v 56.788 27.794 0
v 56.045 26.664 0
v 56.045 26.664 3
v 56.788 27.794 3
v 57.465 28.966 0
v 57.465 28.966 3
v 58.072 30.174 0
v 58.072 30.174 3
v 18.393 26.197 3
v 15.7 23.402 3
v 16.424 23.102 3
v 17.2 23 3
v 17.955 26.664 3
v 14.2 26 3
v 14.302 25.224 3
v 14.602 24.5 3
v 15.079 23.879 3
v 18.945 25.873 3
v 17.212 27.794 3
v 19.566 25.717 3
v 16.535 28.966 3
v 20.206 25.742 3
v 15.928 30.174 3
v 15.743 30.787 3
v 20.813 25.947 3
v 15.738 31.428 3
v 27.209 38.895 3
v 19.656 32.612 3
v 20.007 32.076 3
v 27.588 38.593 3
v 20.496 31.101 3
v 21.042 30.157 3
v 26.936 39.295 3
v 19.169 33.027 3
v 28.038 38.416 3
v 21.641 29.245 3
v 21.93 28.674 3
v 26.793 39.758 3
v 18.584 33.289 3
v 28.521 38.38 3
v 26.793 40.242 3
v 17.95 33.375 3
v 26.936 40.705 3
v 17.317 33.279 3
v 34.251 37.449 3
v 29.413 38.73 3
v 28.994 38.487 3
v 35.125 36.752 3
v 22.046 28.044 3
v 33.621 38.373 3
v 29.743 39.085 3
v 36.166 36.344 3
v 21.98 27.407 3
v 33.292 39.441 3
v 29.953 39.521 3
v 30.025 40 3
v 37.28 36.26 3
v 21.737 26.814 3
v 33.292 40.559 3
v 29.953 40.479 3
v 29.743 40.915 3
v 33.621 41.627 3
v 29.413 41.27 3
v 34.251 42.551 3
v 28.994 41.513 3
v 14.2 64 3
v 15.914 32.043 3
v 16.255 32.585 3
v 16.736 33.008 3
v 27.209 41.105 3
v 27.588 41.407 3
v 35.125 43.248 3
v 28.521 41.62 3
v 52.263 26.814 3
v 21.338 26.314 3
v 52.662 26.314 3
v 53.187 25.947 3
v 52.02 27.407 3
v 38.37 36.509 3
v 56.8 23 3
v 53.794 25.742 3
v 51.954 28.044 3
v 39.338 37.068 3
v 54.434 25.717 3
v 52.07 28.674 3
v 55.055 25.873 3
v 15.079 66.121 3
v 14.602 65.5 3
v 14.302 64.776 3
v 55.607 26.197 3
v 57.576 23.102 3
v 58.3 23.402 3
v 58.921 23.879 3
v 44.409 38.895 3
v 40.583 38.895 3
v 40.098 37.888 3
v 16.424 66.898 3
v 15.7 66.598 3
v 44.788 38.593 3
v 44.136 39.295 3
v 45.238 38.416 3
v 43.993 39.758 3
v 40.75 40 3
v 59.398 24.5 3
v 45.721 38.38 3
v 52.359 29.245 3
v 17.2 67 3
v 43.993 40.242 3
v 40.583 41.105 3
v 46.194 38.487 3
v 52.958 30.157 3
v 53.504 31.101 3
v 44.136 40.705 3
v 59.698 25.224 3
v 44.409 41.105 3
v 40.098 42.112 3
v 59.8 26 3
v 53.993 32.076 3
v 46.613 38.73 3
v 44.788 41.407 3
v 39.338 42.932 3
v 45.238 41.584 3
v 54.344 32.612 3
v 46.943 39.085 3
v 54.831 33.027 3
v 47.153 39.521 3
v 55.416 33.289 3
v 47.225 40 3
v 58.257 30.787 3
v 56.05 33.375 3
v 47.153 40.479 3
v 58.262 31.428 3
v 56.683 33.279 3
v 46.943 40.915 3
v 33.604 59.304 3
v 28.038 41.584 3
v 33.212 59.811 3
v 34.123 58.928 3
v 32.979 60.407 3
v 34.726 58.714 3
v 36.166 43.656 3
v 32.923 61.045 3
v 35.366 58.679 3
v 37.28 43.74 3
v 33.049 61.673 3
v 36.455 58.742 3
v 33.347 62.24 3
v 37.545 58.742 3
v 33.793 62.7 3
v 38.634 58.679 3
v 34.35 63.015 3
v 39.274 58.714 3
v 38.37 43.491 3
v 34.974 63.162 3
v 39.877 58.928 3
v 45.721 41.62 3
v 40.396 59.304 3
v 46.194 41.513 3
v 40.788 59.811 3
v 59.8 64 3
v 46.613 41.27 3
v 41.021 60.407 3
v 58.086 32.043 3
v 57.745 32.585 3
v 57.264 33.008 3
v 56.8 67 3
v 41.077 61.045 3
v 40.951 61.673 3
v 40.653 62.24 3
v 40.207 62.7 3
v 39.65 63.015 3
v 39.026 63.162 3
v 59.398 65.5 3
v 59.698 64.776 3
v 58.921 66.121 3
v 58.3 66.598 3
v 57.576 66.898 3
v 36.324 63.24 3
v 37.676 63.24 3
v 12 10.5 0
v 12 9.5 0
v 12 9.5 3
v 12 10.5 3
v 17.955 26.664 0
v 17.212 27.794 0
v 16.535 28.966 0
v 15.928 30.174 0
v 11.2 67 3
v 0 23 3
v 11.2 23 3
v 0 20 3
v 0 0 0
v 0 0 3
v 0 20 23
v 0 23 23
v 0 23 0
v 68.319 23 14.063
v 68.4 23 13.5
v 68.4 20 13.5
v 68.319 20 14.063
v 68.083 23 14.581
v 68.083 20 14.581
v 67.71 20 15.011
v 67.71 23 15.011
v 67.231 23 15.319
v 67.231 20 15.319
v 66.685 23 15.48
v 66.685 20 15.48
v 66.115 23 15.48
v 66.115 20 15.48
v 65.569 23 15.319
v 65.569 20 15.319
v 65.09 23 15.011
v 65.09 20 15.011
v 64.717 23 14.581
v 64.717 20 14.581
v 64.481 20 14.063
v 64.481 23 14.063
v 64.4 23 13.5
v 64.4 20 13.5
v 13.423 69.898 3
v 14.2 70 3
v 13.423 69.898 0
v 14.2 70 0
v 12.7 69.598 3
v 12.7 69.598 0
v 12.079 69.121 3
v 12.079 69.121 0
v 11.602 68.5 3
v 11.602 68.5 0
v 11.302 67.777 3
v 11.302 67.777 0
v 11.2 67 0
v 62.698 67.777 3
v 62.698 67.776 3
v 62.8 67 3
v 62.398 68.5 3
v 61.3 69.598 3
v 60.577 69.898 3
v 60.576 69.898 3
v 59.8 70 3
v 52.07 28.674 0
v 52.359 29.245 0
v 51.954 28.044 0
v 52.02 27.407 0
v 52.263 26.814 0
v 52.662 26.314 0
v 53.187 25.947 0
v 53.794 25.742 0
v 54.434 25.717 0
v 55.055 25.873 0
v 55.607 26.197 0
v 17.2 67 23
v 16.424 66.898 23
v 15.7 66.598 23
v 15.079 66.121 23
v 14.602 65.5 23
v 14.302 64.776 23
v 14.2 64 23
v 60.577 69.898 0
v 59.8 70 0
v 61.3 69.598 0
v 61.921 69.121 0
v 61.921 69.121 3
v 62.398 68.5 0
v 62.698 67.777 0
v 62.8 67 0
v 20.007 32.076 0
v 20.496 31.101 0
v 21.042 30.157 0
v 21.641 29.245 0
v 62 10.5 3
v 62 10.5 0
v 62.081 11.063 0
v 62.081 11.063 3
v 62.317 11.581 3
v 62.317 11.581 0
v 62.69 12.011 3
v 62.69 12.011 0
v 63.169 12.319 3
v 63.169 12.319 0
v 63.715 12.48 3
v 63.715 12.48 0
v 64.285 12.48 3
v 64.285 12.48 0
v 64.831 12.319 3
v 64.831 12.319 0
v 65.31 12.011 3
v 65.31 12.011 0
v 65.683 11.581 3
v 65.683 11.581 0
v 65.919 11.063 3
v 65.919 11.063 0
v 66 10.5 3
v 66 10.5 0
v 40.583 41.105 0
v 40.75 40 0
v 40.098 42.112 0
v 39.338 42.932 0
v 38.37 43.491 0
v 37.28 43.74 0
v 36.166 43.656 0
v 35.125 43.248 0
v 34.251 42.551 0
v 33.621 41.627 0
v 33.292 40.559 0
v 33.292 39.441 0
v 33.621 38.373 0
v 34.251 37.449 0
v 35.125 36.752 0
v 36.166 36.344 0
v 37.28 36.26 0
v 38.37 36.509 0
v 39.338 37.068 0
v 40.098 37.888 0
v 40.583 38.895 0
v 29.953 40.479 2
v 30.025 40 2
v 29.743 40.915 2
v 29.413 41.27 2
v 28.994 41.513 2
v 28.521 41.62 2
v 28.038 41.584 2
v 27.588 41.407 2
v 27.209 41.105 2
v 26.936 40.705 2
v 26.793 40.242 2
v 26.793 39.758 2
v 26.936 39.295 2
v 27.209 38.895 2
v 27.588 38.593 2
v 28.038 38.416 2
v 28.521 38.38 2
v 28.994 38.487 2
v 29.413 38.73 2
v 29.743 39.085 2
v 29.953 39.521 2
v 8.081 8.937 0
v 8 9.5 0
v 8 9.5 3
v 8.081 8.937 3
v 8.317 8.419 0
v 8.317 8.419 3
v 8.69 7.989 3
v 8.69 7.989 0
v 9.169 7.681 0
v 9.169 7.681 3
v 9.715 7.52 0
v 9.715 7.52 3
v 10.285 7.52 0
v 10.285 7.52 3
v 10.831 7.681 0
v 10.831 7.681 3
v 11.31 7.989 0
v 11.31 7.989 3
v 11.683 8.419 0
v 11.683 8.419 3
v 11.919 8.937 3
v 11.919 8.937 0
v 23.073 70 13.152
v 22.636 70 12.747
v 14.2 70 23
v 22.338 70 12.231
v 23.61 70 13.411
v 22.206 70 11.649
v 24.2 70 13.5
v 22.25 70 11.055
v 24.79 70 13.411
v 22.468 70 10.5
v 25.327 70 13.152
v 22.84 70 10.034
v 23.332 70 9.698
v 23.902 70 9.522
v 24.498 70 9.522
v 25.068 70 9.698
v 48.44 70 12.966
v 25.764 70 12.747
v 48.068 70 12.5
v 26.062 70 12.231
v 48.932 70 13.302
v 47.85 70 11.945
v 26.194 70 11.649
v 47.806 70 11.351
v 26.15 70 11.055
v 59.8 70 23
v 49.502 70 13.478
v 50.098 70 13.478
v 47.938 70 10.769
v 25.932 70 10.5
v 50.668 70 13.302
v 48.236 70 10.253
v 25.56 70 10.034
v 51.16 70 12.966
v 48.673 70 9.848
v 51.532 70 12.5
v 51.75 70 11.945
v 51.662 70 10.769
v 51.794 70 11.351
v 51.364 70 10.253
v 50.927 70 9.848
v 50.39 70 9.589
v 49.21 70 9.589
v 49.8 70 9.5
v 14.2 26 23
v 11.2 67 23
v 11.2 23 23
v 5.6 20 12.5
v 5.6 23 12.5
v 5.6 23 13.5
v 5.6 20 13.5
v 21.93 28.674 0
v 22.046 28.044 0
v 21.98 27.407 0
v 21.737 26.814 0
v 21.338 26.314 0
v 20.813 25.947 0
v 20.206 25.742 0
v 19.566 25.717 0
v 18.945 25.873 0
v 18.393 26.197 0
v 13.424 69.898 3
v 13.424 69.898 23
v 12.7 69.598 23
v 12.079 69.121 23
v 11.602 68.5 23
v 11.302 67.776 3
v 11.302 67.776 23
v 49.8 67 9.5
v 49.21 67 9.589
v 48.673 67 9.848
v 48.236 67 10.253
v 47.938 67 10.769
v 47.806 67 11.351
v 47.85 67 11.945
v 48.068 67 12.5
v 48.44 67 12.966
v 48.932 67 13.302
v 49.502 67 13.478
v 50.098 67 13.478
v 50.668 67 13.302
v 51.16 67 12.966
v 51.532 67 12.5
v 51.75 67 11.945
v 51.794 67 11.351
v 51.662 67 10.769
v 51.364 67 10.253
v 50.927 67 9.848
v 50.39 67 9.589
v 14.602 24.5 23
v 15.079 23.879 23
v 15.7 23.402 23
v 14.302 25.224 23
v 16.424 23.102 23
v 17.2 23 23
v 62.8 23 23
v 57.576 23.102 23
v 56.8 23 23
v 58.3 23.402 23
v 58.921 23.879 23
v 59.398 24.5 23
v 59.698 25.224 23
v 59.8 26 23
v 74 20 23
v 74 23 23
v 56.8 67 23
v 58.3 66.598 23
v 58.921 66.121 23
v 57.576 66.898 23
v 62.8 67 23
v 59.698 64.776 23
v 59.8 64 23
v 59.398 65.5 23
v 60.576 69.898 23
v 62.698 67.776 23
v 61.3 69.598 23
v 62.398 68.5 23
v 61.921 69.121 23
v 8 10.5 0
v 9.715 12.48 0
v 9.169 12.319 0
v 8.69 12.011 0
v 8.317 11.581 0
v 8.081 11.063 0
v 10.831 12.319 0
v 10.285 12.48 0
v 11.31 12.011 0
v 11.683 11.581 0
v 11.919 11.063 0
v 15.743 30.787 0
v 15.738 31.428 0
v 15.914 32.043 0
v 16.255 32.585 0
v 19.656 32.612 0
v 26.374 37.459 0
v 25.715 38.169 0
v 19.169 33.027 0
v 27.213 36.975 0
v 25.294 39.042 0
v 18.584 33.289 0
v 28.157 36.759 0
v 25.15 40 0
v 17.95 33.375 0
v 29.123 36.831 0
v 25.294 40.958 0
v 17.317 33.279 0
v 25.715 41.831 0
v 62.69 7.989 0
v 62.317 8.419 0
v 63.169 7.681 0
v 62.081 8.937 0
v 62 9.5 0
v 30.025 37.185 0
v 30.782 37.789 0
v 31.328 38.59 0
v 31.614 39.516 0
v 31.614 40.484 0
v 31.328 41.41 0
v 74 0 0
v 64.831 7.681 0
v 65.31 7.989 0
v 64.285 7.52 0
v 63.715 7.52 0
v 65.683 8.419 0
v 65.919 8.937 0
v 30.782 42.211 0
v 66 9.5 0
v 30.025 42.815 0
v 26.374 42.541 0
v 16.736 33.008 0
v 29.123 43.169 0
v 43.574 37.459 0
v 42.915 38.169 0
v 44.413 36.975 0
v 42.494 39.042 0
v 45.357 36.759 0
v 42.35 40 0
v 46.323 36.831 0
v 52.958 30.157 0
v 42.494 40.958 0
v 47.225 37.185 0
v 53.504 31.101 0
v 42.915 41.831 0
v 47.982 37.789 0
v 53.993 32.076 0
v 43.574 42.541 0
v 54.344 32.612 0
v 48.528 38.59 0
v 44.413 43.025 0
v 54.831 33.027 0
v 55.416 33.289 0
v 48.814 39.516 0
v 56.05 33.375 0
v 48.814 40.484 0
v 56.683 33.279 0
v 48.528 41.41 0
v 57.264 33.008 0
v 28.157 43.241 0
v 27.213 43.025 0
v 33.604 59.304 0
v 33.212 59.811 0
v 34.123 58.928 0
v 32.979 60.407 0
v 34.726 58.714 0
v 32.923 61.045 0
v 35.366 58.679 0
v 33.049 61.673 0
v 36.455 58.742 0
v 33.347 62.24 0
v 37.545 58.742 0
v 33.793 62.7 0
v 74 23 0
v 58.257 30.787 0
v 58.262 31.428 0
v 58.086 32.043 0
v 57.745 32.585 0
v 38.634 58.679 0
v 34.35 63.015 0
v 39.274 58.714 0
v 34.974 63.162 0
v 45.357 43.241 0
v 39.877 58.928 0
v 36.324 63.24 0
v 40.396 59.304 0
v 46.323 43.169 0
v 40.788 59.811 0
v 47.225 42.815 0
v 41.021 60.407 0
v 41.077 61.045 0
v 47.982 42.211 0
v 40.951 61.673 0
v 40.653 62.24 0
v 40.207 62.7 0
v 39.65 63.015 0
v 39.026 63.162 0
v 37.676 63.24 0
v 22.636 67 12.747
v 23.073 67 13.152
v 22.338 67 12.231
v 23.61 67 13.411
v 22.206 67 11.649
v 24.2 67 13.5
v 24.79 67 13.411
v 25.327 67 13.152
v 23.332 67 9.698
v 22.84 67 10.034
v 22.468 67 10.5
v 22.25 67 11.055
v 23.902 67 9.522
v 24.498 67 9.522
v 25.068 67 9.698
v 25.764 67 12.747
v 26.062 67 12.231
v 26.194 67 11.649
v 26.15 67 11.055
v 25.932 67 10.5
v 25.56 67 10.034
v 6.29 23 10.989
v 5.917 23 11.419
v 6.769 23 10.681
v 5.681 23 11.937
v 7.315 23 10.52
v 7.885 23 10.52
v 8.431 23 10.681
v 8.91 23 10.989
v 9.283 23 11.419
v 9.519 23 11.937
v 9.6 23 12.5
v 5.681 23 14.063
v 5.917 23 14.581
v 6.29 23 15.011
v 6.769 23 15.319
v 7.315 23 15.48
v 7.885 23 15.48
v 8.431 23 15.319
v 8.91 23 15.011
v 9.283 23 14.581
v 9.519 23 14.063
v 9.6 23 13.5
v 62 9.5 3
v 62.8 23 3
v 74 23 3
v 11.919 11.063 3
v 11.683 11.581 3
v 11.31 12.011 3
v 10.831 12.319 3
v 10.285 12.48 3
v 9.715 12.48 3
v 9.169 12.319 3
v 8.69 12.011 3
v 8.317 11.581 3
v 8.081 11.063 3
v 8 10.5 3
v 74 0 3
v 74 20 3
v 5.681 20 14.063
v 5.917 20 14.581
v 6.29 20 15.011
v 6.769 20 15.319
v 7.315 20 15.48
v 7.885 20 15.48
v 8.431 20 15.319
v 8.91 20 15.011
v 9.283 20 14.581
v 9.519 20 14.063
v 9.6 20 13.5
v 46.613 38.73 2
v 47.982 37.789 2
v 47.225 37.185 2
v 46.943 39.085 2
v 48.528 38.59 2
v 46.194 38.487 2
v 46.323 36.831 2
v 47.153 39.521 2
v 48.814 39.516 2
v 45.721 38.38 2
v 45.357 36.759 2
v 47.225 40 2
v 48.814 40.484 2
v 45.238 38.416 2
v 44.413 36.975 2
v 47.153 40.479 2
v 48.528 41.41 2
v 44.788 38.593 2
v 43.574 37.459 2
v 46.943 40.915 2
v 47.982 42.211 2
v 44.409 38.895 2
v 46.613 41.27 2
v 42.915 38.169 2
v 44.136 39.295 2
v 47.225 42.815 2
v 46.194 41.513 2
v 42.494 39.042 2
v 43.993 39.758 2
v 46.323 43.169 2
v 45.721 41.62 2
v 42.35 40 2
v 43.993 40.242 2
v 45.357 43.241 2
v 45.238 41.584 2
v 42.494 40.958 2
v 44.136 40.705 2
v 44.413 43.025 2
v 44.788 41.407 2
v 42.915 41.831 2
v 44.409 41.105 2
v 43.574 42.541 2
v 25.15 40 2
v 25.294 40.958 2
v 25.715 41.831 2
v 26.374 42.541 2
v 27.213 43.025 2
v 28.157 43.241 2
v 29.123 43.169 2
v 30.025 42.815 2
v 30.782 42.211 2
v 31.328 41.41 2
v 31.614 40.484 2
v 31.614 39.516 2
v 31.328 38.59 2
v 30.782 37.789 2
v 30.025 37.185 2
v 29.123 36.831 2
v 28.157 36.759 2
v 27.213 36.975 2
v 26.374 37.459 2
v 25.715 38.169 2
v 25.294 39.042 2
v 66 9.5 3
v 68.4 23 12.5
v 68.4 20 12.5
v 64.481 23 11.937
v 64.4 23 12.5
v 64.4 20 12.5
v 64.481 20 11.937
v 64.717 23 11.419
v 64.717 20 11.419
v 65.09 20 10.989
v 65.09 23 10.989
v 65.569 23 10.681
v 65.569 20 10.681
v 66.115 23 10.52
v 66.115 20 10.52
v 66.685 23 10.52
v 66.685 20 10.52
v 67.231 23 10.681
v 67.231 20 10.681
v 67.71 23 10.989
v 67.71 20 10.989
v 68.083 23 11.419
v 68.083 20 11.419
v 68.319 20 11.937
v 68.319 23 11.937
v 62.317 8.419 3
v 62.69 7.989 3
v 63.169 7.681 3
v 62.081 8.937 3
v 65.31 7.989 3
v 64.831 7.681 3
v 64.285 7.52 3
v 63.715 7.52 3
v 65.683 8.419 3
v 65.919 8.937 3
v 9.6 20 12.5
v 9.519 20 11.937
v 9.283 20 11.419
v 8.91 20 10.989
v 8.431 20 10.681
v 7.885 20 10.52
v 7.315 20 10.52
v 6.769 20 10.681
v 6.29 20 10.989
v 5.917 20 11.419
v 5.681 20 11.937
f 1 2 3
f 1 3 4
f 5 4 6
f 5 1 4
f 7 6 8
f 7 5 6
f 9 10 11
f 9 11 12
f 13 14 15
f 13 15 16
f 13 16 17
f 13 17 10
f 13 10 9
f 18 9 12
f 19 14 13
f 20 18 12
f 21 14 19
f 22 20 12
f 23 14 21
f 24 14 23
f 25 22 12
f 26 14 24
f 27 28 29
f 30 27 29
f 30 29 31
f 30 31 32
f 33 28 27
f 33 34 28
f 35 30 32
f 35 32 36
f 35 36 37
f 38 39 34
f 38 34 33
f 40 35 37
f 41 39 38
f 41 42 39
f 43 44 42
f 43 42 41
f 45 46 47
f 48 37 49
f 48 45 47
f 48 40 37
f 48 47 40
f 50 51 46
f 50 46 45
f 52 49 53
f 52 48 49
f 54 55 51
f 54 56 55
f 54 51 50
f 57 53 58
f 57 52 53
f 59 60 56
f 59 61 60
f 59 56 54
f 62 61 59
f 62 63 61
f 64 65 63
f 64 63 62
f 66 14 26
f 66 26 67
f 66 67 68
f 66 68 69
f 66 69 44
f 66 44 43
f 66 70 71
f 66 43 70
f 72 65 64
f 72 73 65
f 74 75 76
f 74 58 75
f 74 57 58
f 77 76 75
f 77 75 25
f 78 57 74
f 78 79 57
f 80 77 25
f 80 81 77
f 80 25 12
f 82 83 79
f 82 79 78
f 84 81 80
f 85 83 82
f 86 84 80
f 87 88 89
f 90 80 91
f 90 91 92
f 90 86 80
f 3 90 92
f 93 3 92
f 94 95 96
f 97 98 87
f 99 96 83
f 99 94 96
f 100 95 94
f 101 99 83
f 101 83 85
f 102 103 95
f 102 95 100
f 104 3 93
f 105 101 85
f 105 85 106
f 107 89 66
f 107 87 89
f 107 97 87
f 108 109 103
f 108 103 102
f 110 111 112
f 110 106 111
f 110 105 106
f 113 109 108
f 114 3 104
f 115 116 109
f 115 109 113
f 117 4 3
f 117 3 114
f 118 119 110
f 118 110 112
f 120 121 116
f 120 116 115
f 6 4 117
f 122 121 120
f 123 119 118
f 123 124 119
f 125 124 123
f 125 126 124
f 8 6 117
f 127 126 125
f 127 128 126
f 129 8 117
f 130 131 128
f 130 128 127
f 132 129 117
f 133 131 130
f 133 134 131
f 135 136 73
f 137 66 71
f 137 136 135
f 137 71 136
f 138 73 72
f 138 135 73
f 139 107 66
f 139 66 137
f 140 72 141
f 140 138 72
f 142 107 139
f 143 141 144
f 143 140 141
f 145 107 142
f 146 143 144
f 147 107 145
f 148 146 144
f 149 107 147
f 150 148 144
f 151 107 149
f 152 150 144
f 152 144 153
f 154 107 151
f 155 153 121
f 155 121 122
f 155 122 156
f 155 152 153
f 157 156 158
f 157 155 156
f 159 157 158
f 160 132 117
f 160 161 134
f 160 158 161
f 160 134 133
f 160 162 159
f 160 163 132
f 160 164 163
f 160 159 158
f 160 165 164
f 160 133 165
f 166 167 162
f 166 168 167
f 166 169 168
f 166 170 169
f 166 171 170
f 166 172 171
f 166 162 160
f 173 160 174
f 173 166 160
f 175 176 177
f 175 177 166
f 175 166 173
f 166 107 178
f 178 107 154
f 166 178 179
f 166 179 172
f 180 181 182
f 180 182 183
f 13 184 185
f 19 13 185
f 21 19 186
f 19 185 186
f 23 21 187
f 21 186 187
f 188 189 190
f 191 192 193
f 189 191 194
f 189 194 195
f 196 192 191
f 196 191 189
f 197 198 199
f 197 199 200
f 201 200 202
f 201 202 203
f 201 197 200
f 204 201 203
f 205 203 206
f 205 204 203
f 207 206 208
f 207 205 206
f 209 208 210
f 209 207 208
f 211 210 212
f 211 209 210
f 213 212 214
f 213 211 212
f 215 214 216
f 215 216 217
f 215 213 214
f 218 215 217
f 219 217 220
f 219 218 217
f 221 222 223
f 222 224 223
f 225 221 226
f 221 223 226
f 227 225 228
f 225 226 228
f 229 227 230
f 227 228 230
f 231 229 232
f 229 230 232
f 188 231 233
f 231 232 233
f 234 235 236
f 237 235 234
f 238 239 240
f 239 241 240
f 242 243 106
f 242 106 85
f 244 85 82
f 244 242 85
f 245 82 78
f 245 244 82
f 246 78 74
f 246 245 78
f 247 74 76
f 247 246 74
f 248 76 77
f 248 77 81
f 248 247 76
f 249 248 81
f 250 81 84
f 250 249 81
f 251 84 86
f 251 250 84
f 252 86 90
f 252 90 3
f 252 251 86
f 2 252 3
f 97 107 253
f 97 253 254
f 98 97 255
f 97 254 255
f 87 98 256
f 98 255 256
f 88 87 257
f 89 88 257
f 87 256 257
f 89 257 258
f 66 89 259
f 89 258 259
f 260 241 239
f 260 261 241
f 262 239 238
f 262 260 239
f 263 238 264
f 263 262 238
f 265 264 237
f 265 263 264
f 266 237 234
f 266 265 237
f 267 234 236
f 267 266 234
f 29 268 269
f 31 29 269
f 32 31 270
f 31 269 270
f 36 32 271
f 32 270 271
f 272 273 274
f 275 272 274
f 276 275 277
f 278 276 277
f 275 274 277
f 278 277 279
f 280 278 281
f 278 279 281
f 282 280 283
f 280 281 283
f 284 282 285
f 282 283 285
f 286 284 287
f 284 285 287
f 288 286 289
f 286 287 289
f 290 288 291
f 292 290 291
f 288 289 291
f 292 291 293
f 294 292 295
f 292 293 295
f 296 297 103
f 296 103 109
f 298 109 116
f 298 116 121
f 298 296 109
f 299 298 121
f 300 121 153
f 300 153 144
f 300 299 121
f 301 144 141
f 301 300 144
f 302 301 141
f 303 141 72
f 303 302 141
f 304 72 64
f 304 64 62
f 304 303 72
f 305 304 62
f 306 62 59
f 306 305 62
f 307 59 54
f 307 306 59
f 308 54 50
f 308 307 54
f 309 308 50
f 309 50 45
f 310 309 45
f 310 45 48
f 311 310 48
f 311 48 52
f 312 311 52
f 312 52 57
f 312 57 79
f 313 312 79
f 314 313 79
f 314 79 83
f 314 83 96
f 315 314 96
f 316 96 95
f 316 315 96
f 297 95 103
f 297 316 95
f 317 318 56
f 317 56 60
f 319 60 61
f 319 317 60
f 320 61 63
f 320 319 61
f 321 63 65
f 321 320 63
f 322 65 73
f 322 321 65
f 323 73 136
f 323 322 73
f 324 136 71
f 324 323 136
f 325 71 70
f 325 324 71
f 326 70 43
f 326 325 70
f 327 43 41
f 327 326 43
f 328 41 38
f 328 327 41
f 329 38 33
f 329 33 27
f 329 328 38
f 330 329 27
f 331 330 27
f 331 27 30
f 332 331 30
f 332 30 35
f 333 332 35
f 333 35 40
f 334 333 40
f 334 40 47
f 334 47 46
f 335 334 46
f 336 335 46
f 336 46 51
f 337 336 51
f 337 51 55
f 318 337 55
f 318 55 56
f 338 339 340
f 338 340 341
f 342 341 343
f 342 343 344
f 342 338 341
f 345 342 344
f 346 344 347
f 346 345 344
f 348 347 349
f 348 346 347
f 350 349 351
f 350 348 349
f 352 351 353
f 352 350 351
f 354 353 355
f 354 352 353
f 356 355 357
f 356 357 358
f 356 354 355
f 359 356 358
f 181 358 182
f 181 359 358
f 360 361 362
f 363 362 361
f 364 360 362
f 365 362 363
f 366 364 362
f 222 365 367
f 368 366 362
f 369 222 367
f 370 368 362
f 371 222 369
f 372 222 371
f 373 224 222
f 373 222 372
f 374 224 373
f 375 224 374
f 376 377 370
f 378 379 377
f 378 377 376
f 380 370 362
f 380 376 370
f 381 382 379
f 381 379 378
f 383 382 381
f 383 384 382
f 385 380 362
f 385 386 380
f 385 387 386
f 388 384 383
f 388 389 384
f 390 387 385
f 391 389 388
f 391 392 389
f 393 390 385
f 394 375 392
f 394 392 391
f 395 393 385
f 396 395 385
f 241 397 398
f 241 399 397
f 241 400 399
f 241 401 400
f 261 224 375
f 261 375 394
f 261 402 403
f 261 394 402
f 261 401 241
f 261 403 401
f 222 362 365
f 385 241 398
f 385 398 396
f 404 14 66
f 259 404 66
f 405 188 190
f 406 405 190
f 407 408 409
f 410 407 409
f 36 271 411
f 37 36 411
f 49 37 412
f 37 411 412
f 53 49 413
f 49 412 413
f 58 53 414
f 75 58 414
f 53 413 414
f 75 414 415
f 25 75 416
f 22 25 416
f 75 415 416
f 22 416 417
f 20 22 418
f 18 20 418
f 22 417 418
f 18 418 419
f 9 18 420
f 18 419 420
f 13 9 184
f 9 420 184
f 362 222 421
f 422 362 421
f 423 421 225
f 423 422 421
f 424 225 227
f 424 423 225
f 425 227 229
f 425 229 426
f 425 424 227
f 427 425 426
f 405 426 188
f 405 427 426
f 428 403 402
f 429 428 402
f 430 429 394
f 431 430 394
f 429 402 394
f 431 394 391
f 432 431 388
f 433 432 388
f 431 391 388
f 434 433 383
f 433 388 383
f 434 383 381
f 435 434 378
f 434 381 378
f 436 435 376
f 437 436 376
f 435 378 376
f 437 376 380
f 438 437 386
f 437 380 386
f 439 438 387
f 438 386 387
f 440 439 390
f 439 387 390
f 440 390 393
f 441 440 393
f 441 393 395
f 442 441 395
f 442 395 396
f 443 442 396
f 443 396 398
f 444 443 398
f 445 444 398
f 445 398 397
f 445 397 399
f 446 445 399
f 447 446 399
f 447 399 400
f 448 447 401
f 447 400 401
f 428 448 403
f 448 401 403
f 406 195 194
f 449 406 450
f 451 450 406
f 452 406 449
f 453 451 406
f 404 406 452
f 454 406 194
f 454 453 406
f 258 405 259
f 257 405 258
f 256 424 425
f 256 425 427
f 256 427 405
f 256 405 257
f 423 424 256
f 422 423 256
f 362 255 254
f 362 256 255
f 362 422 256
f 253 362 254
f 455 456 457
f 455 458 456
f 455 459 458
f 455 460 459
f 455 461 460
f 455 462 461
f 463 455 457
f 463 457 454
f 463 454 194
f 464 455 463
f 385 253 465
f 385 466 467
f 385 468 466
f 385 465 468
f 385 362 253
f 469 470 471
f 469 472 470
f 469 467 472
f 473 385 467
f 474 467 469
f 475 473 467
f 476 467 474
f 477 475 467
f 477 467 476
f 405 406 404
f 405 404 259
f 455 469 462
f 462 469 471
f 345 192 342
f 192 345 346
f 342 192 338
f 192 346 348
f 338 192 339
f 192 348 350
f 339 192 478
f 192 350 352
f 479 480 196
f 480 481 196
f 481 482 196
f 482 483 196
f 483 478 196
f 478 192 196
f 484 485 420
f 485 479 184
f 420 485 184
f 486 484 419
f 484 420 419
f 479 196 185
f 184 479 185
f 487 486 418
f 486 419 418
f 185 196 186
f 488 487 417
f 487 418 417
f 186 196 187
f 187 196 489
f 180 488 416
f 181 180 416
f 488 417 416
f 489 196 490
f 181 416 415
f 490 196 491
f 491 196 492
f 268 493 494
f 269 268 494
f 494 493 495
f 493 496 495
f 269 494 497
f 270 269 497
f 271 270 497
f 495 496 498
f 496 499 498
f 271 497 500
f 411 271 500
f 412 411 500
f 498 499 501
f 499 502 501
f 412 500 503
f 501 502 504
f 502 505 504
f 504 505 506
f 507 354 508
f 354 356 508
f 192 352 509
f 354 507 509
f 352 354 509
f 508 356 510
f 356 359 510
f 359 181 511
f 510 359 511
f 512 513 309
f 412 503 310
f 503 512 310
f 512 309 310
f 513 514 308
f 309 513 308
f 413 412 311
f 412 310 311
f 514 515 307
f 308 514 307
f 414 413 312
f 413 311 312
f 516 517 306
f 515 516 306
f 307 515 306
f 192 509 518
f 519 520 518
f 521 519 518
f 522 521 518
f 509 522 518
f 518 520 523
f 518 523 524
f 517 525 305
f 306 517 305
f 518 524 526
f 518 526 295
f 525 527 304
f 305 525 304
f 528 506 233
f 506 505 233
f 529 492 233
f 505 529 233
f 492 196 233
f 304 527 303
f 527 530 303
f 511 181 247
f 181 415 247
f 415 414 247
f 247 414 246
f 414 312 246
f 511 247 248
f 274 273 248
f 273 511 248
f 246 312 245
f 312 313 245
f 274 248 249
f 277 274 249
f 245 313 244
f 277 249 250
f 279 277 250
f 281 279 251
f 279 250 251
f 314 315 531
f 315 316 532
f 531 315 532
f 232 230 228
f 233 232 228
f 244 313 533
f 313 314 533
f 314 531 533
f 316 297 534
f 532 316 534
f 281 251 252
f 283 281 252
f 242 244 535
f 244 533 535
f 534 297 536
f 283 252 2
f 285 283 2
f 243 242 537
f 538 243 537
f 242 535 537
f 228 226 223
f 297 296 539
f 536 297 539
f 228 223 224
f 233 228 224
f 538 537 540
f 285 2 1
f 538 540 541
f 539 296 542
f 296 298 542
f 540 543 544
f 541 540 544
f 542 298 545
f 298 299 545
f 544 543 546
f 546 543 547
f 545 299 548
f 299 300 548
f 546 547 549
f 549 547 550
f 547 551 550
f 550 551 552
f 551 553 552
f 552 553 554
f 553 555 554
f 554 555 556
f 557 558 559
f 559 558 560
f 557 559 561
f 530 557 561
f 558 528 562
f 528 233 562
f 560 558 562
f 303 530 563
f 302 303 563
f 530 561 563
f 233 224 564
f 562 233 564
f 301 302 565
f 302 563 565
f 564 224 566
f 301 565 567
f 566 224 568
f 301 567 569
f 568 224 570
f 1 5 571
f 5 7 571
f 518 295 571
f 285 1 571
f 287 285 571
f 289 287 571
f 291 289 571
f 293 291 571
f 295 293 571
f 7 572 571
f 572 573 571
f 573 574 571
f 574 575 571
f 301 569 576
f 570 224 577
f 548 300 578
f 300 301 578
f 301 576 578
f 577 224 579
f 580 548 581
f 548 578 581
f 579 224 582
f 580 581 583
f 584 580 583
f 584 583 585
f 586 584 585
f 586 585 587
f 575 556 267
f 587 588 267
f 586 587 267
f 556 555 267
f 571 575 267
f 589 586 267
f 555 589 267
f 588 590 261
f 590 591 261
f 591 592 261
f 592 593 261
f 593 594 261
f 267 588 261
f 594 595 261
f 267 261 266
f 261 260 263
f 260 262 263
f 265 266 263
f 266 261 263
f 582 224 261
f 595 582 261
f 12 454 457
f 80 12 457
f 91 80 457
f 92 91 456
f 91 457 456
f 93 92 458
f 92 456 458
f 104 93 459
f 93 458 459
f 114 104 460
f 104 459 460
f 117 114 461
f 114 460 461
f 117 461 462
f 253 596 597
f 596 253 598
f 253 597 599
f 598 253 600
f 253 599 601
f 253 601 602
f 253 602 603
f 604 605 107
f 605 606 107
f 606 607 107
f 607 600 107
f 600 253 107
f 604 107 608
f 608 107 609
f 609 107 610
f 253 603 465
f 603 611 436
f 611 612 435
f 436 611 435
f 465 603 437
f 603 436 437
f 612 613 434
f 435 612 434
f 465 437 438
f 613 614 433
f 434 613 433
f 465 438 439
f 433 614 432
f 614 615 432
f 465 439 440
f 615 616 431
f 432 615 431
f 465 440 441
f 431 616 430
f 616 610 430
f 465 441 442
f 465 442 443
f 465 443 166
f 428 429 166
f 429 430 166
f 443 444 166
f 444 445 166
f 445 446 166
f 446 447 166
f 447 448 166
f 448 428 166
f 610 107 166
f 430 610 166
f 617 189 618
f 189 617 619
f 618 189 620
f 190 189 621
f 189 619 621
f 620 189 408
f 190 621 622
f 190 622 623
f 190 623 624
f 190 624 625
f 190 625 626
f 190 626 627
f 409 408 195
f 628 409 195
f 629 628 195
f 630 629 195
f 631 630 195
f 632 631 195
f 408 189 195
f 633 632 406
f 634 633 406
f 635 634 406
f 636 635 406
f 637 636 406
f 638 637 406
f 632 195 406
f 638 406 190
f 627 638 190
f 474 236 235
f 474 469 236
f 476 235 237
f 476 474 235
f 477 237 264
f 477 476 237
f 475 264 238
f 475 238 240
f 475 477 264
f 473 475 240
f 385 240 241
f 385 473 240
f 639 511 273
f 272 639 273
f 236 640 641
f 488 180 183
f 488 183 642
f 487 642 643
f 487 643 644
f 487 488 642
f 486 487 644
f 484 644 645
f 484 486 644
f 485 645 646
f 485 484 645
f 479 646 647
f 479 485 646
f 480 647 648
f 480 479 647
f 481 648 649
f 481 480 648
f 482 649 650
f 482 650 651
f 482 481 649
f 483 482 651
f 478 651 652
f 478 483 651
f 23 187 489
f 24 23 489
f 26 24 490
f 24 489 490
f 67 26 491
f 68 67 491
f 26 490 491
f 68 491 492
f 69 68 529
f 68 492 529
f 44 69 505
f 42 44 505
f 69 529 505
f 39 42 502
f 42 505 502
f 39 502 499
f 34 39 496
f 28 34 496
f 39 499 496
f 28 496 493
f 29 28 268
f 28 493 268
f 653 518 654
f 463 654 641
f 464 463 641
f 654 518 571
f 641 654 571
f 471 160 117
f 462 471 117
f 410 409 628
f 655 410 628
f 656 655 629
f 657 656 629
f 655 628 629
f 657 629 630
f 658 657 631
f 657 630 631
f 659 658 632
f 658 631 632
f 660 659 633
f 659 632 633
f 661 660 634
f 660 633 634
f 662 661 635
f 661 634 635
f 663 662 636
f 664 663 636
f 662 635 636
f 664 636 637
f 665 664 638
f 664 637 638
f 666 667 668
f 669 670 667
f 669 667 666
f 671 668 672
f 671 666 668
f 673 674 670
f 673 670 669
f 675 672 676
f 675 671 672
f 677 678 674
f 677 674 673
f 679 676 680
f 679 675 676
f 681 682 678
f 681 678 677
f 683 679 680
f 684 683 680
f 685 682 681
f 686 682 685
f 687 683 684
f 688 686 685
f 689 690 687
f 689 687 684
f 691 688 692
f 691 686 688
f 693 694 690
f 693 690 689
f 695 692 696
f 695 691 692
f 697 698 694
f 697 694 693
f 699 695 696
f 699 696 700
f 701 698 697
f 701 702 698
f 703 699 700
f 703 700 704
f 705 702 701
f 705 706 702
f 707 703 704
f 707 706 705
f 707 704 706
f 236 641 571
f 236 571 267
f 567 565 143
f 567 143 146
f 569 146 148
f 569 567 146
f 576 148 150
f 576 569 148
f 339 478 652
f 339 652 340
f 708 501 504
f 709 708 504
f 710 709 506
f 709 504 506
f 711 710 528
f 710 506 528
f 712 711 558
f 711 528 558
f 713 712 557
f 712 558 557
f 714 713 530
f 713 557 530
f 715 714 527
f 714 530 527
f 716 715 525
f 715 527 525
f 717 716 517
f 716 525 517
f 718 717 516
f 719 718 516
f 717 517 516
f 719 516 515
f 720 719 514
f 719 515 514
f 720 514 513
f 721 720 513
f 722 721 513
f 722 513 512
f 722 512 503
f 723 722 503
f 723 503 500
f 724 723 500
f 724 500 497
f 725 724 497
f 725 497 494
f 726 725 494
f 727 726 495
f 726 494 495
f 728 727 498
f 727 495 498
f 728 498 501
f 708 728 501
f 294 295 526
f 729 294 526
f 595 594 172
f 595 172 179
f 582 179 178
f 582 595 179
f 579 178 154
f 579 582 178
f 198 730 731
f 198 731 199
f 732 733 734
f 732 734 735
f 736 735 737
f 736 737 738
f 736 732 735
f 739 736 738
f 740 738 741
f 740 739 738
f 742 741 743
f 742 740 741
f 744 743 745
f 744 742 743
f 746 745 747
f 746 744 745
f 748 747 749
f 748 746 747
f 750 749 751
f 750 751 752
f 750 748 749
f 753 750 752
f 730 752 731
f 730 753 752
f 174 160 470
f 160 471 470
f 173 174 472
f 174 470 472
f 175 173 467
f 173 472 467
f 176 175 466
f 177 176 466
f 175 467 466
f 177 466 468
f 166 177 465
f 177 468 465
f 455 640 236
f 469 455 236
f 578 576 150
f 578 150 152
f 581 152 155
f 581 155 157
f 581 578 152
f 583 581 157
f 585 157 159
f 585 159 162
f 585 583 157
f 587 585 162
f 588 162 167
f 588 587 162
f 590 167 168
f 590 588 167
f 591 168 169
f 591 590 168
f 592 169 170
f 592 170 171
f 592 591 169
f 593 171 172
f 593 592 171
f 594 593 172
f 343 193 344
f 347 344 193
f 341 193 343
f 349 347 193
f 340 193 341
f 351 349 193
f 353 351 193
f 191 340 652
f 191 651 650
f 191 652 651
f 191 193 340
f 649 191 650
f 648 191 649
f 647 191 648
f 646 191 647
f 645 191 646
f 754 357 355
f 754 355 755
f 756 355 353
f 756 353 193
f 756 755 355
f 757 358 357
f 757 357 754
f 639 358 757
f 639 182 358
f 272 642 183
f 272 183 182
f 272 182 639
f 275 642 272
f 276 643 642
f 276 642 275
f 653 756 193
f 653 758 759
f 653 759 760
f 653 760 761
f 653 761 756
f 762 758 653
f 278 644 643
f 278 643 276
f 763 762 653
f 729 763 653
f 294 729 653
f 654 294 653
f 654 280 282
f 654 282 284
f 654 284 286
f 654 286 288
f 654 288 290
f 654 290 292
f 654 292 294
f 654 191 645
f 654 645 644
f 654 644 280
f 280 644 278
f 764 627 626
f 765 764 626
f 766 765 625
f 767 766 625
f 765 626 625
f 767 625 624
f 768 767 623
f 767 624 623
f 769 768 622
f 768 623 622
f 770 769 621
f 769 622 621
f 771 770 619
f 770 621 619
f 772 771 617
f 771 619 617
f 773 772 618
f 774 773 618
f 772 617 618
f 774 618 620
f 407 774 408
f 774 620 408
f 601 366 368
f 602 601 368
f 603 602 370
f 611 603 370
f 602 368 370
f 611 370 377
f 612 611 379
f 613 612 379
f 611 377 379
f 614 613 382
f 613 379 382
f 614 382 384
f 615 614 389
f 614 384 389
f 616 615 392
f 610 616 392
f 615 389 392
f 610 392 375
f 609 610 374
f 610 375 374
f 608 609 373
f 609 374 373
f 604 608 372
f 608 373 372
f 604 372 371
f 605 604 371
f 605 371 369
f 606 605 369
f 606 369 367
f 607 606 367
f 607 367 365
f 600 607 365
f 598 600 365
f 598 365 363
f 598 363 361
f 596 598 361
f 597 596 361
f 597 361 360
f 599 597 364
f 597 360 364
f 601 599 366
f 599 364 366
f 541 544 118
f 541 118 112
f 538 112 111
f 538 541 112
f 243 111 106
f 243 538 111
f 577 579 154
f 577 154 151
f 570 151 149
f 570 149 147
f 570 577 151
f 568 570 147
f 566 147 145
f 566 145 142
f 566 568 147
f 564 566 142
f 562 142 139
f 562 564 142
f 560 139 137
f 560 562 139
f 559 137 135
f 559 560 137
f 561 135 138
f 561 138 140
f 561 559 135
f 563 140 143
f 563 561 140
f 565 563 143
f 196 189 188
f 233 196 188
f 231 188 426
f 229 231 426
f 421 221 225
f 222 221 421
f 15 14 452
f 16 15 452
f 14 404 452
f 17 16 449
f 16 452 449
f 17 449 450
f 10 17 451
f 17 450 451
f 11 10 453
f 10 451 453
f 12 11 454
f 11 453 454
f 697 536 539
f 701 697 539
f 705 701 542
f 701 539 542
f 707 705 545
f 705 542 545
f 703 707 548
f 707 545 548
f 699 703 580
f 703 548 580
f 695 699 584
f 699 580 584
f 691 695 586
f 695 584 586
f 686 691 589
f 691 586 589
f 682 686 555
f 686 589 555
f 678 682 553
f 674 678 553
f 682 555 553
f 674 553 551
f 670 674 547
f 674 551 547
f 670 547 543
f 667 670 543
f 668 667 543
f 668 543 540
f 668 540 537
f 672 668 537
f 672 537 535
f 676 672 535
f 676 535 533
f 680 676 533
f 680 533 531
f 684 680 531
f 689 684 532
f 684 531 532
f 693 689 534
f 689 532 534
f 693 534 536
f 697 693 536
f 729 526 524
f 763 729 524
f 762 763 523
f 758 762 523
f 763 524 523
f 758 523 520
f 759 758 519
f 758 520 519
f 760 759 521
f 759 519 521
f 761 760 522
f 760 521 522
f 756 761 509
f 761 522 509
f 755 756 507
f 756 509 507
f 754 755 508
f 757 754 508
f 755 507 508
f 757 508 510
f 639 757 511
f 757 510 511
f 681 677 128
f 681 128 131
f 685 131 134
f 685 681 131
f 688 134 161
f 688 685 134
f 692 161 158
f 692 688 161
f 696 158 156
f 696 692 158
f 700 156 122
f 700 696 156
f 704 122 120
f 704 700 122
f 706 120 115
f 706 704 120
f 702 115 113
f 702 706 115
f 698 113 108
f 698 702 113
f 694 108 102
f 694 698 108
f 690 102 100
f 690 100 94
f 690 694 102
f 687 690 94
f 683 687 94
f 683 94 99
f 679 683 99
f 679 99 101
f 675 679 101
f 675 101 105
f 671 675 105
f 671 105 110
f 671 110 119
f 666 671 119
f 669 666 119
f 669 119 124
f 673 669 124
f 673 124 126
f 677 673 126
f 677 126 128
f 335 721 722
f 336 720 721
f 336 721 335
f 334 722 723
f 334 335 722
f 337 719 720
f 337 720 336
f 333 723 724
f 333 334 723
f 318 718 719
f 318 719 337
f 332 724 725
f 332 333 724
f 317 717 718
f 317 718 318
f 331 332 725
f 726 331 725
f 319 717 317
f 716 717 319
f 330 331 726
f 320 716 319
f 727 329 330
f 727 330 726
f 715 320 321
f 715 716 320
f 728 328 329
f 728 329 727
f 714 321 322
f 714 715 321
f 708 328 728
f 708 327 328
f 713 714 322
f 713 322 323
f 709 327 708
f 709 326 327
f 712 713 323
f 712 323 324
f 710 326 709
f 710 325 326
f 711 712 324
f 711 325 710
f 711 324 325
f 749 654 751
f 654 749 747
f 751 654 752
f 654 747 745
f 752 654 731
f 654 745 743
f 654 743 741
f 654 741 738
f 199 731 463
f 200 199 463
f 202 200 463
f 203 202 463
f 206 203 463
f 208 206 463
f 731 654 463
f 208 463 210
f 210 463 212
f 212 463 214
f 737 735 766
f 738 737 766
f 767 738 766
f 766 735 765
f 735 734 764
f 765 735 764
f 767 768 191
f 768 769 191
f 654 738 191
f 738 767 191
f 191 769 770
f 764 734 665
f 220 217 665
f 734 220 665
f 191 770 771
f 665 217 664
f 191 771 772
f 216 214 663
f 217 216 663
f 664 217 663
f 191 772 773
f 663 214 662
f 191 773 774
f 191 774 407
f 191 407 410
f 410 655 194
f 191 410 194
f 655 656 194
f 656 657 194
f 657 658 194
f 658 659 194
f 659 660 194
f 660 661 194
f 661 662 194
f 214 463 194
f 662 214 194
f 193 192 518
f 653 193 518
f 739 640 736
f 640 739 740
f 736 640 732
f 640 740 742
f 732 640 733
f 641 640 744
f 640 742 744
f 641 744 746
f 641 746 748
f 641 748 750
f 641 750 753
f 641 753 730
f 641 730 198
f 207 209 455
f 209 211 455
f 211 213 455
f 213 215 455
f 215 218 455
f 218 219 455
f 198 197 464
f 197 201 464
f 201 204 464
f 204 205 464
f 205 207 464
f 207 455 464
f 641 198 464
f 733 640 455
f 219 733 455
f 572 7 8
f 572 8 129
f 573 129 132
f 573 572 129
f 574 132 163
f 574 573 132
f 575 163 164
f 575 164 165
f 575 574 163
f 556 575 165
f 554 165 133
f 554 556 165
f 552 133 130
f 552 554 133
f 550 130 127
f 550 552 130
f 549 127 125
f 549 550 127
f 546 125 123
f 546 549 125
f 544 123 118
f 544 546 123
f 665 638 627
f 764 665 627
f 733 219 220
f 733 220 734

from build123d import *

# Parameters (mm, degrees)
SKETCH1_W           = 74
SKETCH1_H           = 70
SKETCH1_R           = 3.75
SKETCH1_R_2         = 1.625
BOSS_EXTRUDE1_DEPTH = 3
BOSS_EXTRUDE2_DEPTH = 20
CUT_EXTRUDE2_DEPTH  = 3
FILLET1_R           = 3
FILLET2_R           = 3
FILLET4_R           = 3
FILLET5_R           = 3
CUT_EXTRUDE4_DEPTH  = 3
FILLET6_R           = 3
FILLET7_R           = 3
FILLET8_R           = 3
FILLET9_R           = 3
SKETCH11_R          = 2
CUT_EXTRUDE5_DEPTH  = 3
SKETCH12_R          = 3.25
CUT_EXTRUDE6_DEPTH  = 2


with BuildPart() as part:
    # Sketch1 → Boss-Extrude1 (new body)
    with BuildSketch(Plane.XY):
        with Locations((37, 35)):
            Rectangle(SKETCH1_W, SKETCH1_H)
        with Locations((37, 40)):
            Circle(SKETCH1_R, mode=Mode.SUBTRACT)
        with Locations((28.4, 40)):
            Circle(SKETCH1_R_2, mode=Mode.SUBTRACT)
        with Locations((45.6, 40)):
            Circle(SKETCH1_R_2, mode=Mode.SUBTRACT)
        with BuildLine():
            Line((8, 10.5), (8, 9.5))
            ThreePointArc((8, 9.5), (10, 7.5), (12, 9.5))
            Line((12, 9.5), (12, 10.5))
            ThreePointArc((12, 10.5), (10, 12.5), (8, 10.5))
        make_face(mode=Mode.SUBTRACT)
        with BuildLine():
            Line((66, 10.5), (66, 9.5))
            ThreePointArc((66, 9.5), (64, 7.5), (62, 9.5))
            Line((62, 9.5), (62, 10.5))
            ThreePointArc((62, 10.5), (64, 12.5), (66, 10.5))
        make_face(mode=Mode.SUBTRACT)
        with BuildLine():
            ThreePointArc((34.973628981, 63.161526731), (32.928291332, 60.723988239), (35.365829823, 58.678650589))
            ThreePointArc((35.365829823, 58.678650589), (37, 58.75), (38.634170177, 58.678650589))
            ThreePointArc((38.634170177, 58.678650589), (41.071708668, 60.723988239), (39.026371019, 63.161526731))
            ThreePointArc((39.026371019, 63.161526731), (37, 63.25), (34.973628981, 63.161526731))
        make_face(mode=Mode.SUBTRACT)
        with BuildLine():
            ThreePointArc((15.928343951, 30.174125415), (17.016645383, 33.164209024), (20.006728993, 32.075907592))
            ThreePointArc((20.006728993, 32.075907592), (20.762023679, 30.625), (21.64089917, 29.245441818))
            ThreePointArc((21.64089917, 29.245441818), (21.088354052, 26.111802737), (17.95471497, 26.664347855))
            ThreePointArc((17.95471497, 26.664347855), (16.864909362, 28.375), (15.928343951, 30.174125415))
        make_face(mode=Mode.SUBTRACT)
        with BuildLine():
            ThreePointArc((58.071656049, 30.174125415), (56.983354617, 33.164209024), (53.993271007, 32.075907592))
            ThreePointArc((53.993271007, 32.075907592), (53.237976321, 30.625), (52.35910083, 29.245441818))
            ThreePointArc((52.35910083, 29.245441818), (52.911645948, 26.111802737), (56.04528503, 26.664347855))
            ThreePointArc((56.04528503, 26.664347855), (57.135090638, 28.375), (58.071656049, 30.174125415))
        make_face(mode=Mode.SUBTRACT)
    extrude(amount=BOSS_EXTRUDE1_DEPTH)

    # Sketch2 → Loft1 section 0
    with BuildSketch(Plane.XY.offset(3)):
        with BuildLine():
            Line((0, 23), (74, 23))
            Line((74, 23), (74, 20))
            Line((74, 20), (0, 20))
            Line((0, 20), (0, 23))
        make_face()
    # Sketch3 → Loft1 section 1
    with BuildSketch(Plane.XY.offset(23)):
        with BuildLine():
            Line((0, 23), (74, 23))
            Line((74, 23), (74, 20))
            Line((74, 20), (0, 20))
            Line((0, 20), (0, 23))
        make_face()
    loft()

    # Sketch4 → Boss-Extrude2 (add)
    with BuildSketch(Plane.XY.offset(3)):
        Polygon((14.2, 23), (14.2, 67), (59.8, 67), (59.8, 23), (62.8, 23), (62.8, 70), (11.2, 70), (11.2, 23), align=None)
    extrude(amount=BOSS_EXTRUDE2_DEPTH)

    # Sketch8 → Cut-Extrude2 (cut)
    with BuildSketch(Plane(origin=(0, 23, 0), x_dir=(1, 0, 0), z_dir=(0, 1, 0))):
        with BuildLine():
            Line((5.6, -12.5), (5.6, -13.5))
            ThreePointArc((5.6, -13.5), (7.6, -15.5), (9.6, -13.5))
            Line((9.6, -13.5), (9.6, -12.5))
            ThreePointArc((9.6, -12.5), (7.6, -10.5), (5.6, -12.5))
        make_face()
        with BuildLine():
            Line((68.4, -12.5), (68.4, -13.5))
            ThreePointArc((68.4, -13.5), (66.4, -15.5), (64.4, -13.5))
            Line((64.4, -13.5), (64.4, -12.5))
            ThreePointArc((64.4, -12.5), (66.4, -10.5), (68.4, -12.5))
        make_face()
    extrude(amount=-CUT_EXTRUDE2_DEPTH, mode=Mode.SUBTRACT)

    # Fillet1
    fillet1_edges = [part.edges().sort_by_distance(p)[0] for p in [
        (11.2, 70, 13),
    ]]
    fillet(fillet1_edges, radius=FILLET1_R)

    # Fillet2
    fillet2_edges = [part.edges().sort_by_distance(p)[0] for p in [
        (62.8, 70, 13),
    ]]
    fillet(fillet2_edges, radius=FILLET2_R)

    # Fillet4
    fillet4_edges = [part.edges().sort_by_distance(p)[0] for p in [
        (59.8, 67, 13),
    ]]
    fillet(fillet4_edges, radius=FILLET4_R)

    # Fillet5
    fillet5_edges = [part.edges().sort_by_distance(p)[0] for p in [
        (14.2, 67, 13),
    ]]
    fillet(fillet5_edges, radius=FILLET5_R)

    # Sketch10 → Cut-Extrude4 (cut)
    with BuildSketch(Plane.XY.offset(3)):
        Polygon((0, 23), (11.2, 67), (11.2, 70), (0, 70), align=None)
        Polygon((74, 23), (62.8, 67), (62.8, 70), (74, 70), align=None)
    extrude(amount=-CUT_EXTRUDE4_DEPTH, mode=Mode.SUBTRACT)

    # Fillet6
    fillet6_edges = [part.edges().sort_by_distance(p)[0] for p in [
        (62.8, 70, 1.5),
    ]]
    fillet(fillet6_edges, radius=FILLET6_R - 0.0001)  # a hair under: the kernel refuses the full size

    # Fillet7
    fillet7_edges = [part.edges().sort_by_distance(p)[0] for p in [
        (11.2, 70, 1.5),
    ]]
    fillet(fillet7_edges, radius=FILLET7_R - 0.0001)  # a hair under: the kernel refuses the full size

    # Fillet8
    fillet8_edges = [part.edges().sort_by_distance(p)[0] for p in [
        (14.2, 23, 13),
    ]]
    fillet(fillet8_edges, radius=FILLET8_R)

    # Fillet9
    fillet9_edges = [part.edges().sort_by_distance(p)[0] for p in [
        (59.8, 23, 13),
    ]]
    fillet(fillet9_edges, radius=FILLET9_R)

    # Sketch11 → Cut-Extrude5 (cut)
    with BuildSketch(Plane(origin=(0, 70, 0), x_dir=(1, 0, 0), z_dir=(0, 1, 0))):
        with Locations(Location((24.2, -11.5, 0), (0, 0, 270))):
            Circle(SKETCH11_R)
        with Locations(Location((49.8, -11.5, 0), (0, 0, 90))):
            Circle(SKETCH11_R)
    extrude(amount=-CUT_EXTRUDE5_DEPTH, mode=Mode.SUBTRACT)

    # Sketch12 → Cut-Extrude6 (cut)
    with BuildSketch(Plane(origin=(0, 0, 0), x_dir=(-1, 0, 0), z_dir=(0, 0, -1))):
        with Locations((-45.6, 40)):
            Circle(SKETCH12_R)
        with Locations((-28.4, 40)):
            Circle(SKETCH12_R)
    extrude(amount=-CUT_EXTRUDE6_DEPTH, mode=Mode.SUBTRACT)


solid = part.part
